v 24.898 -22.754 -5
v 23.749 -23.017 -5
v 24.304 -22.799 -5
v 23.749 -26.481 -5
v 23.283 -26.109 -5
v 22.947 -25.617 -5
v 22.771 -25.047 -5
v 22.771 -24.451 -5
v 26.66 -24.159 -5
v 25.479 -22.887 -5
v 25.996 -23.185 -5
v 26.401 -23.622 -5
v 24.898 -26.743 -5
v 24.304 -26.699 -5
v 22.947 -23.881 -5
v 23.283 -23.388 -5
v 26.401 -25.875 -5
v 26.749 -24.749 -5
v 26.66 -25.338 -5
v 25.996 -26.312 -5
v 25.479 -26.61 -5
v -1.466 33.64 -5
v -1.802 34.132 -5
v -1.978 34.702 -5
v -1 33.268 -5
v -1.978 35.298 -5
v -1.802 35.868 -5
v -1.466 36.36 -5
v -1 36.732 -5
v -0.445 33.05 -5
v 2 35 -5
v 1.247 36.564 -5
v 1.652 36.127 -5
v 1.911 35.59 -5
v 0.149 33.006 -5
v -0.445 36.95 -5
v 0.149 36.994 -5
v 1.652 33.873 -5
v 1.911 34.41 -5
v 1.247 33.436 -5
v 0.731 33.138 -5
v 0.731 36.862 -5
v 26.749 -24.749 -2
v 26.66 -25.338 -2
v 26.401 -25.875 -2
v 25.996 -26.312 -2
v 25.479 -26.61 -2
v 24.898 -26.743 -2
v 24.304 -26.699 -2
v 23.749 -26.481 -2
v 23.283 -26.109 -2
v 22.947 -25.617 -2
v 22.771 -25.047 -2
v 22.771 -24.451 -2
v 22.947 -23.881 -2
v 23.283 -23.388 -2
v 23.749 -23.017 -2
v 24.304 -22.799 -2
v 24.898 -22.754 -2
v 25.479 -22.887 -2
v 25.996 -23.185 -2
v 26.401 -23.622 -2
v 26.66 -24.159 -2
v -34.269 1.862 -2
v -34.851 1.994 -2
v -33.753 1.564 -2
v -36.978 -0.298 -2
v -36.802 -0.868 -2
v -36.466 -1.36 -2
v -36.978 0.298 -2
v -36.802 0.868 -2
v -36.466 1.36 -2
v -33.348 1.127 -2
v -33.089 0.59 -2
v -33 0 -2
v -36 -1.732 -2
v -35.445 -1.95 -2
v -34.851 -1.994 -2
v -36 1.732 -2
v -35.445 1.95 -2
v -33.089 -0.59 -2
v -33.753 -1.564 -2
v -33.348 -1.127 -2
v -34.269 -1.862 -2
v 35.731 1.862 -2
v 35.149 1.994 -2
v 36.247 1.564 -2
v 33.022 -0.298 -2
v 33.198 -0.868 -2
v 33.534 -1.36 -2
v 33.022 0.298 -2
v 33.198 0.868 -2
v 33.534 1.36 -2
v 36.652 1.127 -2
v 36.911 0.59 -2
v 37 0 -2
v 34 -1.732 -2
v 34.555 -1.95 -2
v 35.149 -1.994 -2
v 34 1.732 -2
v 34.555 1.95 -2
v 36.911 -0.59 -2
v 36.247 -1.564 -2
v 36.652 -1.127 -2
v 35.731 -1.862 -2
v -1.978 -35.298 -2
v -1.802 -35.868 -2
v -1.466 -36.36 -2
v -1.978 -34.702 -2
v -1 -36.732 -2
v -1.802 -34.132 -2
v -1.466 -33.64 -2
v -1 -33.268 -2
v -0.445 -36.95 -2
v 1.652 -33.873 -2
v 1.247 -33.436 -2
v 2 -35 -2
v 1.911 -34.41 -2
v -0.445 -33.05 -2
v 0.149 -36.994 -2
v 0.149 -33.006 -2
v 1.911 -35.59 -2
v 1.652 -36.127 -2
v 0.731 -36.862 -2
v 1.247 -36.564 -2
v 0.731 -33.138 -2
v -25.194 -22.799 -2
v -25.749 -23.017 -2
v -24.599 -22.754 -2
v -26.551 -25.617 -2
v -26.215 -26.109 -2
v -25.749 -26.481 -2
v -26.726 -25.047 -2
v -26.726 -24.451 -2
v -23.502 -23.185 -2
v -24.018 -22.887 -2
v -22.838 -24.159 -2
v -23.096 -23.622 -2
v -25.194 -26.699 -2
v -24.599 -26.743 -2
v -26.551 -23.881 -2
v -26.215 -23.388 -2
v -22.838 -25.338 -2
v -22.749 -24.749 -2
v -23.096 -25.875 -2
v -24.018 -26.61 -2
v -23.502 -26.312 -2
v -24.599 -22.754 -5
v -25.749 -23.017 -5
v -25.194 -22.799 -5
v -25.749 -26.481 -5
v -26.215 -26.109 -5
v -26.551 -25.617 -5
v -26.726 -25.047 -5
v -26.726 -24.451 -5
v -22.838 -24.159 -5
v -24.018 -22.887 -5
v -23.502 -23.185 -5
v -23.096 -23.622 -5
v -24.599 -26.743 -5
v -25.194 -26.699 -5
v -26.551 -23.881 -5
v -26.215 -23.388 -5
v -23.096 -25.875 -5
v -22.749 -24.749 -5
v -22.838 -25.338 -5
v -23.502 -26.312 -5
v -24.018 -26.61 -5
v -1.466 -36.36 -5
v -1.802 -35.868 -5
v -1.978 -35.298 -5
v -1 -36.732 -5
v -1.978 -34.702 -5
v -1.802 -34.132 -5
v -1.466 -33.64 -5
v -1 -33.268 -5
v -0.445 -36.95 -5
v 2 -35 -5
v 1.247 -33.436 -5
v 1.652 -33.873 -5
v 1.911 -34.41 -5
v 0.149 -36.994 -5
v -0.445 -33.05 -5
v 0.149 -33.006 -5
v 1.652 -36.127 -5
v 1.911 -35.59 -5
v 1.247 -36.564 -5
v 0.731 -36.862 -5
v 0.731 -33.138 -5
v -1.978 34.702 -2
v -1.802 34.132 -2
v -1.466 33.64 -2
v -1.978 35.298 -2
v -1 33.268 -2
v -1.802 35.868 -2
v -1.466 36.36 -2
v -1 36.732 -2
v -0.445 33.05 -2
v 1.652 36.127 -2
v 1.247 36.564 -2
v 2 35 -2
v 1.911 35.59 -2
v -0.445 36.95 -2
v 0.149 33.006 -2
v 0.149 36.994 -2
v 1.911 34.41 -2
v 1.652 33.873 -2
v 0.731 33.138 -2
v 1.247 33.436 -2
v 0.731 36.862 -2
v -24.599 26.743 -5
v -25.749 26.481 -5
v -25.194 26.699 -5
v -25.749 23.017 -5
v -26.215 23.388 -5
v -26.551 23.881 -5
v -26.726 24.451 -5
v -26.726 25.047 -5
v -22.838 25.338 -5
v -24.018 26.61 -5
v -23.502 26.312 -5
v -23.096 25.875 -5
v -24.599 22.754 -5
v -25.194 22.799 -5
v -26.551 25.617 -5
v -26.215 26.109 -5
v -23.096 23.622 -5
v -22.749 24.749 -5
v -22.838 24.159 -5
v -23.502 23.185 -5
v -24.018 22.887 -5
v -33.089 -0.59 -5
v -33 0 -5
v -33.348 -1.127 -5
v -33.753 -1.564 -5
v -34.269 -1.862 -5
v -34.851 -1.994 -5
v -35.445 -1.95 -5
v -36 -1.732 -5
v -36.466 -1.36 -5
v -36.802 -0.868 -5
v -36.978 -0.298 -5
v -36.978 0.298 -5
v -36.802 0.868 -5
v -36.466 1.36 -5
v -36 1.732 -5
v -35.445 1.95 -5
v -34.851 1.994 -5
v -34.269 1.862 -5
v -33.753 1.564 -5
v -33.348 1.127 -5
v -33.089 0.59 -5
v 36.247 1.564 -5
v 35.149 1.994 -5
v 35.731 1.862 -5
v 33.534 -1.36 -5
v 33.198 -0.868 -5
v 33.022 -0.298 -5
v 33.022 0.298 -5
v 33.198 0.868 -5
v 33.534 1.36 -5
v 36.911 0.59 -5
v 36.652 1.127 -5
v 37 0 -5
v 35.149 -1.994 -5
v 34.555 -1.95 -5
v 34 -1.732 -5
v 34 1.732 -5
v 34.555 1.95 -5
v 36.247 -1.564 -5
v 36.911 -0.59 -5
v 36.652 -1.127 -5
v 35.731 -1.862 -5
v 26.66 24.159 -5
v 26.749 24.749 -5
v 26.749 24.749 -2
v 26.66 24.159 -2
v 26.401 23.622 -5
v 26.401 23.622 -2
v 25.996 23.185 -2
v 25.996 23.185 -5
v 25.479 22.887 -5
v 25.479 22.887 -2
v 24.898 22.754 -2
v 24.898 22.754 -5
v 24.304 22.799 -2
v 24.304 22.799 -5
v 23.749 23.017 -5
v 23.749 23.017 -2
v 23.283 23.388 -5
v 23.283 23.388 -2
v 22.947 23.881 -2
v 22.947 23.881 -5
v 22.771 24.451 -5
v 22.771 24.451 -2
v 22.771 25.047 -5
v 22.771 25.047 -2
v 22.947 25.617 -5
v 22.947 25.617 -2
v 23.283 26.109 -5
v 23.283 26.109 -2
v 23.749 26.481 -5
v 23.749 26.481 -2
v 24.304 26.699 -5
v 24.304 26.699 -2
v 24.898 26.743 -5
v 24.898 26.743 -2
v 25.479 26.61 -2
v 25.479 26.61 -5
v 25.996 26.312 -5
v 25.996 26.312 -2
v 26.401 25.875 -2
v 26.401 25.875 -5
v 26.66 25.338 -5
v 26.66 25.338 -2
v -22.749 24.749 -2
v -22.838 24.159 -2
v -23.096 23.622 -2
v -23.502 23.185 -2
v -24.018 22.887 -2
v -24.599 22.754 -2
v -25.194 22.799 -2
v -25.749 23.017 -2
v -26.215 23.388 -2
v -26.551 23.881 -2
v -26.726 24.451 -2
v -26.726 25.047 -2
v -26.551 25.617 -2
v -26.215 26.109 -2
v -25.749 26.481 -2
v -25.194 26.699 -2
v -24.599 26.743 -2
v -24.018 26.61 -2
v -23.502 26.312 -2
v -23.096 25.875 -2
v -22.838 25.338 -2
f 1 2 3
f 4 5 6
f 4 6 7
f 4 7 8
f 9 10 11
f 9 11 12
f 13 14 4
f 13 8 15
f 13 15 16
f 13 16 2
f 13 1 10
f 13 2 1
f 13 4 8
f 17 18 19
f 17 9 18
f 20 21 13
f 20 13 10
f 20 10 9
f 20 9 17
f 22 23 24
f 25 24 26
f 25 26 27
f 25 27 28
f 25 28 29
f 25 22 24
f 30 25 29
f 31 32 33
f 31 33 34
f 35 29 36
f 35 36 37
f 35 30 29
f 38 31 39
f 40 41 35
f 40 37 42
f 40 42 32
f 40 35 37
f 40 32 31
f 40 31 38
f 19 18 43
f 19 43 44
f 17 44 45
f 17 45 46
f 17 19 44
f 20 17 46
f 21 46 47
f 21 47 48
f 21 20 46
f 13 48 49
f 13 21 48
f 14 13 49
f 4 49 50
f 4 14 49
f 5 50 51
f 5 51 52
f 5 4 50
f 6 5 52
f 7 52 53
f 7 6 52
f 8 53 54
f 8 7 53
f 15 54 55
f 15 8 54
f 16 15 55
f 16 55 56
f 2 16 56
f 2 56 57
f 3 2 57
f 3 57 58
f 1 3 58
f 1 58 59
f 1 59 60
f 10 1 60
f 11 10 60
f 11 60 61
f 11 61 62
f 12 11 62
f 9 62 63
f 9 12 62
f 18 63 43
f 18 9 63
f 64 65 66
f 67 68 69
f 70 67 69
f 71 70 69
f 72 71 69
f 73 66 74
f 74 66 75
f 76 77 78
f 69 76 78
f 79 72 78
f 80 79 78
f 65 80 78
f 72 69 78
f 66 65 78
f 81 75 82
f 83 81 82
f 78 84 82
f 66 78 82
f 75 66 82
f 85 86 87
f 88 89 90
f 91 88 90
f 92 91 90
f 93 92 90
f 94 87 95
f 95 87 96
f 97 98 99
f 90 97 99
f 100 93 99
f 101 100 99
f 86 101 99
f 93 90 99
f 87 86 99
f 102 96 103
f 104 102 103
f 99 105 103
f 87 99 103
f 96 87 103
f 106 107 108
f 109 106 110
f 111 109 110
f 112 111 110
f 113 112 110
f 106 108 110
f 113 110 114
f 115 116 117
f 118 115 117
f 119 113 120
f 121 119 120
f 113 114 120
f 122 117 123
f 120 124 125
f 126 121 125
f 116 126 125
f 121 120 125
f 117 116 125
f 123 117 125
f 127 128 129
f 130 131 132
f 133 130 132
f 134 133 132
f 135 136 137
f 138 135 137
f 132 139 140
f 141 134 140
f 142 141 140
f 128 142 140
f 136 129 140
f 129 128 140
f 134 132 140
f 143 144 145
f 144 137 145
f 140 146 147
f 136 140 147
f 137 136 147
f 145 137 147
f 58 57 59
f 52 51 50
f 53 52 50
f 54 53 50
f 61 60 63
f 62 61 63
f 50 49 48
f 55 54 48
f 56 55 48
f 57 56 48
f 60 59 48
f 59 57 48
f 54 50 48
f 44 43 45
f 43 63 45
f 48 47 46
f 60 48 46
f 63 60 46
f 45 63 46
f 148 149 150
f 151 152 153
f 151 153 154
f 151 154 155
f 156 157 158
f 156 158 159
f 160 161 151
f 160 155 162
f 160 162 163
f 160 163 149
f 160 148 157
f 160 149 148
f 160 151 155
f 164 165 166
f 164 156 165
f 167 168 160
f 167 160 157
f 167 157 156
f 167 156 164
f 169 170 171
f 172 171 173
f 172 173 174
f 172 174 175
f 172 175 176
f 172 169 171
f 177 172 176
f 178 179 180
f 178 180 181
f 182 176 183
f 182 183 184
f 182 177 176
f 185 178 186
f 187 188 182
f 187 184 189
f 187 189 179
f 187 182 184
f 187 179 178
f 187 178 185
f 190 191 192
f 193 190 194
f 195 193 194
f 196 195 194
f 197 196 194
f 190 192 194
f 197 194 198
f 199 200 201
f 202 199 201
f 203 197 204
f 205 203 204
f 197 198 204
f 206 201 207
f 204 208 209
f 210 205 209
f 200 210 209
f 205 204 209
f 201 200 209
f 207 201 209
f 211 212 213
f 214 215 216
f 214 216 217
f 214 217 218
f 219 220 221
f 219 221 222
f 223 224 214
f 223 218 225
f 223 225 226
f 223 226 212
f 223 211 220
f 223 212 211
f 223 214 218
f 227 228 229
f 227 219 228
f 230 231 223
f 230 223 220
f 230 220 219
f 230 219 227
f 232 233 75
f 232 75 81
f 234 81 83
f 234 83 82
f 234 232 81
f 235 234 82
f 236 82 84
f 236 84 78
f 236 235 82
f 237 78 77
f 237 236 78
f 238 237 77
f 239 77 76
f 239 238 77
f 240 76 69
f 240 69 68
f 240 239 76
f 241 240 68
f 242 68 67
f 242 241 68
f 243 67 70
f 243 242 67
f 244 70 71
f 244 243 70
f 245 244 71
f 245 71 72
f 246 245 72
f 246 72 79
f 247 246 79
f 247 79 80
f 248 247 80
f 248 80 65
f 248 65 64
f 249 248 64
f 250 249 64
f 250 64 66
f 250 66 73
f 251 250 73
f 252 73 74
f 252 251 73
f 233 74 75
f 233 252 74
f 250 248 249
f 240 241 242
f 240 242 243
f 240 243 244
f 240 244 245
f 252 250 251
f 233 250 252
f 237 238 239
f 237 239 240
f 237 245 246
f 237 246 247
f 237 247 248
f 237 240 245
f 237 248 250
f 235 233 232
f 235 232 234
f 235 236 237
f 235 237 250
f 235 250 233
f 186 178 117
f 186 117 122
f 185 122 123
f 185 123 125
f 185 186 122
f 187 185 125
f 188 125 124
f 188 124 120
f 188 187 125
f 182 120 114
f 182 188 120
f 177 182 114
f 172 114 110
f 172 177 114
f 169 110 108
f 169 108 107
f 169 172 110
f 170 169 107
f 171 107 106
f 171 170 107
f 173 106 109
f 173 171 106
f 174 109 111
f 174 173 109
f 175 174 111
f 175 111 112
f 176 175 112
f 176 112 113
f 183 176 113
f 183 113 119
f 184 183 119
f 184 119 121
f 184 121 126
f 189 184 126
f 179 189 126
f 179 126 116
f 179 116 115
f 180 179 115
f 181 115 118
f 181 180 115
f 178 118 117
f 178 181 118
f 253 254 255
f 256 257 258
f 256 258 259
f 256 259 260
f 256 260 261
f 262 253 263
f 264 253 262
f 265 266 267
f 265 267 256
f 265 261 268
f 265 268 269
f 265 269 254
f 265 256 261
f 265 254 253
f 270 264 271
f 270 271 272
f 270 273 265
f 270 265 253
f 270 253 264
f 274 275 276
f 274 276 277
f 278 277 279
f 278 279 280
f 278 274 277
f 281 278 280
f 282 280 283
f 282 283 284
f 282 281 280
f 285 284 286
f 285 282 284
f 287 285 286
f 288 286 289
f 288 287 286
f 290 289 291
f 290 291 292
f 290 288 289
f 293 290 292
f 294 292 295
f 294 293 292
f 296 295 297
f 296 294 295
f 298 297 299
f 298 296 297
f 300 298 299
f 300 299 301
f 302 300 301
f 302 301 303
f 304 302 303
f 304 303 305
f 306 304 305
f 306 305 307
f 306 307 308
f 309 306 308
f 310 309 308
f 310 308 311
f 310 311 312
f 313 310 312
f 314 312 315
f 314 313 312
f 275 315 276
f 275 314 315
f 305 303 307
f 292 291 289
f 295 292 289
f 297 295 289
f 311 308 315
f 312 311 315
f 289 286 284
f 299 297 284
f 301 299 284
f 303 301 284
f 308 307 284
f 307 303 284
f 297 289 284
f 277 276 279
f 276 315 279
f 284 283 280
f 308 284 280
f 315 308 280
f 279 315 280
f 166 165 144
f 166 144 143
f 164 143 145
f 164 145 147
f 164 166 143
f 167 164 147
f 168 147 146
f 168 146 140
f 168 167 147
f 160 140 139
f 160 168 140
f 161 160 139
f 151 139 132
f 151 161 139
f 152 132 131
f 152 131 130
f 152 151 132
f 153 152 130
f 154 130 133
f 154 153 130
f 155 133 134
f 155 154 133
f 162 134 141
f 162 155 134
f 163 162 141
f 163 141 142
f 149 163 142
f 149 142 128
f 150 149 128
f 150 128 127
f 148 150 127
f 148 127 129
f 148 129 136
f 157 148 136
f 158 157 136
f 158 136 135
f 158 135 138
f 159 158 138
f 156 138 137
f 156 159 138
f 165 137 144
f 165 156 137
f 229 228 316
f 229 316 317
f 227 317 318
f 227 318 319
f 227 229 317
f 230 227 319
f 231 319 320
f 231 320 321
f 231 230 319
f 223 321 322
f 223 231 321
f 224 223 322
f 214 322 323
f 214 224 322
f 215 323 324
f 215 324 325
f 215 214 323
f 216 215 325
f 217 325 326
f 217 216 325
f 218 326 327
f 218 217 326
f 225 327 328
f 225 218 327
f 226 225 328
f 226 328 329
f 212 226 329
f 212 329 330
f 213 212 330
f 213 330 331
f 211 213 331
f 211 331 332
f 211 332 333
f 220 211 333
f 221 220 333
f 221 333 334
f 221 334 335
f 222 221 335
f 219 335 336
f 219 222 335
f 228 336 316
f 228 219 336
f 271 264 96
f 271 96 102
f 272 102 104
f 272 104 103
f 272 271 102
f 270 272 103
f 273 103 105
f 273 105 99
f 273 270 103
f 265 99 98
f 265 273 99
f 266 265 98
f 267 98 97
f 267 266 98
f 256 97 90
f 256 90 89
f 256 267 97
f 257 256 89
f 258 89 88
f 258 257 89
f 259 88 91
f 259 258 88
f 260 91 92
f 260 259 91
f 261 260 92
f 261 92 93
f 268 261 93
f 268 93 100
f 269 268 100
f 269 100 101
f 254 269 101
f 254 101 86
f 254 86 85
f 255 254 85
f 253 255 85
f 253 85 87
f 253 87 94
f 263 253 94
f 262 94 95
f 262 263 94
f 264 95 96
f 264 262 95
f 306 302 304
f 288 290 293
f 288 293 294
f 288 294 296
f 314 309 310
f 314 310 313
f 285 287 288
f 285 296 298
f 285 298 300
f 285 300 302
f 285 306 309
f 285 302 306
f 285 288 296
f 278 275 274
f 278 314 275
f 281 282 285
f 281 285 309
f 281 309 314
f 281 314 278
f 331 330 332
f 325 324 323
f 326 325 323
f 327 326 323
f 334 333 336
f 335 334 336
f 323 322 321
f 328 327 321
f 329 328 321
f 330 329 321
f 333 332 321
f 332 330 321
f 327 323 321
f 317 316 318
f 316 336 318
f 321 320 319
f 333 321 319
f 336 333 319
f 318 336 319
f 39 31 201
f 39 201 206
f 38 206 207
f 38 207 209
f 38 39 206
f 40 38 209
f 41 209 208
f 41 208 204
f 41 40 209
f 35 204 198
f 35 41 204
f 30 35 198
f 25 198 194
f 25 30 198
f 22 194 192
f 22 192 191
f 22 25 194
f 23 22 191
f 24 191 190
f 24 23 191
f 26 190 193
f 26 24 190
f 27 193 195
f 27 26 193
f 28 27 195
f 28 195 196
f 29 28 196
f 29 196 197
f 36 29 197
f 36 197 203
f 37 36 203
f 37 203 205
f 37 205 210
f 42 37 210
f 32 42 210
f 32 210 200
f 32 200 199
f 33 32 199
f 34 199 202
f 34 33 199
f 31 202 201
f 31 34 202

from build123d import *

# Parameters (mm, degrees)
F2_R     = 2
F3_DEPTH = 3


# Not quite as in the source:
# - a feature of the source that left no trace in its solid (it failed there, or was rolled back) is left out
# - the program builds the solid bodies; features that only make, move or delete a surface that nothing else refers to are left out


with BuildPart() as f3:
    # F2 (on face) → F3 (new body)
    with BuildSketch(Plane(origin=(0, 0, -5), x_dir=(1, 0, 0), z_dir=(0, 0, -1))):
        with Locations((0, -35)):
            Circle(F2_R)
    extrude(amount=-F3_DEPTH)


with BuildPart() as f3b:
    # F2 (on face) → F3, piece 2 (new body)
    with BuildSketch(Plane(origin=(0, 0, -5), x_dir=(1, 0, 0), z_dir=(0, 0, -1))):
        with Locations((24.7487373415, -24.7487373415)):
            Circle(F2_R)
    extrude(amount=-F3_DEPTH)


with BuildPart() as f3c:
    # F2 (on face) → F3, piece 3 (new body)
    with BuildSketch(Plane(origin=(0, 0, -5), x_dir=(1, 0, 0), z_dir=(0, 0, -1))):
        with Locations((35, 0)):
            Circle(F2_R)
    extrude(amount=-F3_DEPTH)


with BuildPart() as f3d:
    # F2 (on face) → F3, piece 4 (new body)
    with BuildSketch(Plane(origin=(0, 0, -5), x_dir=(1, 0, 0), z_dir=(0, 0, -1))):
        with Locations((24.7487373415, 24.7487373415)):
            Circle(F2_R)
    extrude(amount=-F3_DEPTH)


with BuildPart() as f3e:
    # F2 (on face) → F3, piece 5 (new body)
    with BuildSketch(Plane(origin=(0, 0, -5), x_dir=(1, 0, 0), z_dir=(0, 0, -1))):
        with Locations((0, 35)):
            Circle(F2_R)
    extrude(amount=-F3_DEPTH)


with BuildPart() as f3f:
    # F2 (on face) → F3, piece 6 (new body)
    with BuildSketch(Plane(origin=(0, 0, -5), x_dir=(1, 0, 0), z_dir=(0, 0, -1))):
        with Locations((-24.7487373415, 24.7487373415)):
            Circle(F2_R)
    extrude(amount=-F3_DEPTH)


with BuildPart() as f3g:
    # F2 (on face) → F3, piece 7 (new body)
    with BuildSketch(Plane(origin=(0, 0, -5), x_dir=(1, 0, 0), z_dir=(0, 0, -1))):
        with Locations((-35, 0)):
            Circle(F2_R)
    extrude(amount=-F3_DEPTH)


with BuildPart() as f3h:
    # F2 (on face) → F3, piece 8 (new body)
    with BuildSketch(Plane(origin=(0, 0, -5), x_dir=(1, 0, 0), z_dir=(0, 0, -1))):
        with Locations((-24.7487373415, -24.7487373415)):
            Circle(F2_R)
    extrude(amount=-F3_DEPTH)


solid = Compound([f3.part, f3b.part, f3c.part, f3d.part, f3e.part, f3f.part, f3g.part, f3h.part])
